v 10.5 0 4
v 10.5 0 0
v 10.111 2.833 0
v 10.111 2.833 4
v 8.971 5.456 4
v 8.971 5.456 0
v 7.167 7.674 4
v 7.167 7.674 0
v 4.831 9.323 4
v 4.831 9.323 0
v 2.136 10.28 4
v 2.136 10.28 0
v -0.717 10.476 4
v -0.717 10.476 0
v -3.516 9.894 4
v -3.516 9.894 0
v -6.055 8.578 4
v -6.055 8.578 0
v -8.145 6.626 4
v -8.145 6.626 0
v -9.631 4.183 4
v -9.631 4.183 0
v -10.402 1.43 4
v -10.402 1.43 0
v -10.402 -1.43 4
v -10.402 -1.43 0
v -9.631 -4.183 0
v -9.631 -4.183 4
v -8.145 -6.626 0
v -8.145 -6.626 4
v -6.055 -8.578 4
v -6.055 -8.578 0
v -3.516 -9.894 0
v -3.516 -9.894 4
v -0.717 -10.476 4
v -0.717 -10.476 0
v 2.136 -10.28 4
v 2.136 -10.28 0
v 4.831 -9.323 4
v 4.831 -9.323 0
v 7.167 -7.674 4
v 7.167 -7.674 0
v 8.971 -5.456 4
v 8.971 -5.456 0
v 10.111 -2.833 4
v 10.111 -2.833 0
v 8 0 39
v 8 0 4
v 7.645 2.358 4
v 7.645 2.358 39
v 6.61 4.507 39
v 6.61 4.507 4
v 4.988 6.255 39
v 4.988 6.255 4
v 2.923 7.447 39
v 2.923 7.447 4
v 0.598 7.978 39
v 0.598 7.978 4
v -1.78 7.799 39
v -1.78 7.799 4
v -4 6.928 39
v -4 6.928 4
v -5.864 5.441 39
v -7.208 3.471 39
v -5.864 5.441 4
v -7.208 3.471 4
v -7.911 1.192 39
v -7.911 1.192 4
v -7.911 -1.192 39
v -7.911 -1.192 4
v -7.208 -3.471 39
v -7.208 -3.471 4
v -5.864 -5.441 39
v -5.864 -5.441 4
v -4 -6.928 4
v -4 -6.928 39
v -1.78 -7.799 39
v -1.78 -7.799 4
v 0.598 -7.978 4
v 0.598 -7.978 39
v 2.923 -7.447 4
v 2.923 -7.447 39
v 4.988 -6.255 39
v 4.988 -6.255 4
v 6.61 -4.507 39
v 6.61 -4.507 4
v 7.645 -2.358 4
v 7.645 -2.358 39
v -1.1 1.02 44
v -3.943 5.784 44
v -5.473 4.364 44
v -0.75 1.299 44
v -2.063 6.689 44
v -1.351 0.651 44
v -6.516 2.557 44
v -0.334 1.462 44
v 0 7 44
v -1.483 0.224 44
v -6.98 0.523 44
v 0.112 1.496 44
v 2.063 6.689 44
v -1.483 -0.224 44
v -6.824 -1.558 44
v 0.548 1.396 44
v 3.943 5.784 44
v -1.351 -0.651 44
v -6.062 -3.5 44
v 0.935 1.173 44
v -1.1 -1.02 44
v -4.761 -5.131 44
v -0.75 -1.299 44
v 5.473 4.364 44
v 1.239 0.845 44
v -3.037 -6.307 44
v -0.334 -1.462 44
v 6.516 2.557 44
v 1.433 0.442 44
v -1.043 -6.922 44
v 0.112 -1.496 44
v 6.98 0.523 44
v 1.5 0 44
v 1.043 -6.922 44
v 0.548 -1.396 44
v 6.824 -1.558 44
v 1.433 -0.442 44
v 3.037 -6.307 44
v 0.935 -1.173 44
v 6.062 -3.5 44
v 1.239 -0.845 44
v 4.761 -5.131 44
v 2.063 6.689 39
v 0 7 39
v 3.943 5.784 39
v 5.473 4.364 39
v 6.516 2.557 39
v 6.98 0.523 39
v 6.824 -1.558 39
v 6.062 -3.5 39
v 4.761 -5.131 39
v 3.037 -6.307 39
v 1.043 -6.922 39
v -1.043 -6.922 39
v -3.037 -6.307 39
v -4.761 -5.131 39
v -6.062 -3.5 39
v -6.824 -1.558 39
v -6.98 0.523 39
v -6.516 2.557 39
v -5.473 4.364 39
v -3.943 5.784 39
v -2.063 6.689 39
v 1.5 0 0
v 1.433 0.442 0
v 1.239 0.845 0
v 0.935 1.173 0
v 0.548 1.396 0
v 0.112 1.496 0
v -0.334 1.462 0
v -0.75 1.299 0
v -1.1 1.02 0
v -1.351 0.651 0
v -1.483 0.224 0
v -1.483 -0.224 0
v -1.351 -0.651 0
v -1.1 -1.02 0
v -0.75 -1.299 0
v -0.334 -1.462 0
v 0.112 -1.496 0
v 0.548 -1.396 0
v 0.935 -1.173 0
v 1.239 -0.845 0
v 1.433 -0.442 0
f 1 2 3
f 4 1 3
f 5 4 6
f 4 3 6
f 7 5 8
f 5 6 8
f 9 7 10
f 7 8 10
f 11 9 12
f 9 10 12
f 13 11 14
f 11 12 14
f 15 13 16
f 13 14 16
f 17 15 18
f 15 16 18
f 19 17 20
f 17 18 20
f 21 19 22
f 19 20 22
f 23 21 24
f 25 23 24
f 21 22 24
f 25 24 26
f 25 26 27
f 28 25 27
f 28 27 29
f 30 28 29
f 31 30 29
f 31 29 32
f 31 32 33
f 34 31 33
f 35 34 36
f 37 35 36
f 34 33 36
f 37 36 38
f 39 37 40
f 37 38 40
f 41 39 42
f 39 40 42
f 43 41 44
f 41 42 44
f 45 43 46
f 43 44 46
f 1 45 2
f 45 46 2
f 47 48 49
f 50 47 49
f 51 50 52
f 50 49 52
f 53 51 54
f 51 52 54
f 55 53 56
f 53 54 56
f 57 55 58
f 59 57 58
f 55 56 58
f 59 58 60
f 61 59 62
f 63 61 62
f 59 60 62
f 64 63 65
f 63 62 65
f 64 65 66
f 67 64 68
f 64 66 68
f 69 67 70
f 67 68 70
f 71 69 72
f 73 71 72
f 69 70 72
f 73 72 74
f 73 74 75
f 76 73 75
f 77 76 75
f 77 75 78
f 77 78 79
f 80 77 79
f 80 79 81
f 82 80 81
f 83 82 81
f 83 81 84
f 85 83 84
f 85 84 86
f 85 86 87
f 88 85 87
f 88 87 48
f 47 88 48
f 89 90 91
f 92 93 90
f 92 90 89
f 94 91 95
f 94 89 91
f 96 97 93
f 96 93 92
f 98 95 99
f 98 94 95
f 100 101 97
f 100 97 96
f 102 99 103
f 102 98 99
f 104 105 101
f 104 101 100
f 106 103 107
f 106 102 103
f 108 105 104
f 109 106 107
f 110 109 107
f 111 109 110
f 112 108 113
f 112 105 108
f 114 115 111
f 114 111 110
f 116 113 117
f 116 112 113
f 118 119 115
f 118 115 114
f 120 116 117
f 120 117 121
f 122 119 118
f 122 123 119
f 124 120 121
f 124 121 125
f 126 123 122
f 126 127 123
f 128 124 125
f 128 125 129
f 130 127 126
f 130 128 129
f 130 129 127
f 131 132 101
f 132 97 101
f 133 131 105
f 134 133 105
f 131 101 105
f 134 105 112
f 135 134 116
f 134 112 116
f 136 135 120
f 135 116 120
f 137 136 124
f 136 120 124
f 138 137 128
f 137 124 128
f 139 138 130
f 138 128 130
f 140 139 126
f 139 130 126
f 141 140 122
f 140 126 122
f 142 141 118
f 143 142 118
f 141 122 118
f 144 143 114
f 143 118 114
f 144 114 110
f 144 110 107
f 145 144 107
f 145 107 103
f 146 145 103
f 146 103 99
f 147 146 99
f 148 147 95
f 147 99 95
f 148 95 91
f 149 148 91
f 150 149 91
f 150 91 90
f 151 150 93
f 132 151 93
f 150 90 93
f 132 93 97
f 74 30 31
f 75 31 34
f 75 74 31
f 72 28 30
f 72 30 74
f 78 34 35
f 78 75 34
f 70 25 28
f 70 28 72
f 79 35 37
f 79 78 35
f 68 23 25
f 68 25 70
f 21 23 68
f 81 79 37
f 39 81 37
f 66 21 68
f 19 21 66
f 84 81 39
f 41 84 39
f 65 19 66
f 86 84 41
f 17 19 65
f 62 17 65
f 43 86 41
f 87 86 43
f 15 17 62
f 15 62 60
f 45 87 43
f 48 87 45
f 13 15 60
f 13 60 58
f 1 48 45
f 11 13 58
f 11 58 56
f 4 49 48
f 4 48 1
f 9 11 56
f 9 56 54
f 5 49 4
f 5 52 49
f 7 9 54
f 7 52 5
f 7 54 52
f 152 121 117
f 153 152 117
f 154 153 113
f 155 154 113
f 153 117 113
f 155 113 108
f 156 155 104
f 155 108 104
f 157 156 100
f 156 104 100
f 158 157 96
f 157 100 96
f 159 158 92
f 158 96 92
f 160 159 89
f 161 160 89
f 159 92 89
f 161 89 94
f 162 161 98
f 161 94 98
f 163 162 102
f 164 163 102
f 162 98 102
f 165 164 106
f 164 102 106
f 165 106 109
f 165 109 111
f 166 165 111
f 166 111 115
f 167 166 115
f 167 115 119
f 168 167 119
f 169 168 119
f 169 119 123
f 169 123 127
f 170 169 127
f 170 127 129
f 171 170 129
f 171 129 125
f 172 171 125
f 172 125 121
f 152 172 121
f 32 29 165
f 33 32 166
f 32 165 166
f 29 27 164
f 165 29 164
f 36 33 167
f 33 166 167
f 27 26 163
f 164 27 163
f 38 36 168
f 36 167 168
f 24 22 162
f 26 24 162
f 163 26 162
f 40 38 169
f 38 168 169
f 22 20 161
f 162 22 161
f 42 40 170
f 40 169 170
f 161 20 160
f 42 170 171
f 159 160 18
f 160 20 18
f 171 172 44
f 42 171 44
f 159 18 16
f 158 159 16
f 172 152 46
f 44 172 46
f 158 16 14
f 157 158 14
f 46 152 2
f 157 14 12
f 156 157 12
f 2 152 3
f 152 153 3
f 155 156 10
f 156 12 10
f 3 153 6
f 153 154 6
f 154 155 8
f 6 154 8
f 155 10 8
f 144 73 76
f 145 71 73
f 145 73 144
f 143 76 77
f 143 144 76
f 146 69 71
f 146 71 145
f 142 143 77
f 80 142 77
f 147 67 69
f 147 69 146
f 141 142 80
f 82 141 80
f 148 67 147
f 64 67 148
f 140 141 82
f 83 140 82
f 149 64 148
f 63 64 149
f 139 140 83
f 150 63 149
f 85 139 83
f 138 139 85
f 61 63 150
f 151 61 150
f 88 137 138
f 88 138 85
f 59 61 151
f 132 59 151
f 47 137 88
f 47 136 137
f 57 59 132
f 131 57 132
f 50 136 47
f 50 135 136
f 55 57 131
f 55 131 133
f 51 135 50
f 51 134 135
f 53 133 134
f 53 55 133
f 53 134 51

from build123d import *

# Parameters (mm, degrees)
F0_R     = 10.5
F1_DEPTH = 4
F2_R     = 8
F3_DEPTH = 39
F4_W     = 7
F4_H     = 5
F6_R     = 1.5
F7_DEPTH = 47.7


with BuildPart() as f1:
    # F0 (on Top) → F1 (new body)
    with BuildSketch(Plane.XY):
        Circle(F0_R)
    extrude(amount=F1_DEPTH)

    # F2 (on Top) → F3 (join)
    with BuildSketch(Plane.XY):
        Circle(F2_R)
    extrude(amount=F3_DEPTH)

    # F4 (on Right) → F5 (revolve)
    with BuildSketch(Plane.YZ):
        with Locations((3.5, 41.5)):
            Rectangle(F4_W, F4_H)
    revolve(axis=Axis((0, 0, 41.5), (0, 0, -1)))

    # F6 (on face) → F7 (cut)
    with BuildSketch(Plane.XY.offset(44)):
        Circle(F6_R)
    extrude(amount=-F7_DEPTH, mode=Mode.SUBTRACT)


solid = f1.part
